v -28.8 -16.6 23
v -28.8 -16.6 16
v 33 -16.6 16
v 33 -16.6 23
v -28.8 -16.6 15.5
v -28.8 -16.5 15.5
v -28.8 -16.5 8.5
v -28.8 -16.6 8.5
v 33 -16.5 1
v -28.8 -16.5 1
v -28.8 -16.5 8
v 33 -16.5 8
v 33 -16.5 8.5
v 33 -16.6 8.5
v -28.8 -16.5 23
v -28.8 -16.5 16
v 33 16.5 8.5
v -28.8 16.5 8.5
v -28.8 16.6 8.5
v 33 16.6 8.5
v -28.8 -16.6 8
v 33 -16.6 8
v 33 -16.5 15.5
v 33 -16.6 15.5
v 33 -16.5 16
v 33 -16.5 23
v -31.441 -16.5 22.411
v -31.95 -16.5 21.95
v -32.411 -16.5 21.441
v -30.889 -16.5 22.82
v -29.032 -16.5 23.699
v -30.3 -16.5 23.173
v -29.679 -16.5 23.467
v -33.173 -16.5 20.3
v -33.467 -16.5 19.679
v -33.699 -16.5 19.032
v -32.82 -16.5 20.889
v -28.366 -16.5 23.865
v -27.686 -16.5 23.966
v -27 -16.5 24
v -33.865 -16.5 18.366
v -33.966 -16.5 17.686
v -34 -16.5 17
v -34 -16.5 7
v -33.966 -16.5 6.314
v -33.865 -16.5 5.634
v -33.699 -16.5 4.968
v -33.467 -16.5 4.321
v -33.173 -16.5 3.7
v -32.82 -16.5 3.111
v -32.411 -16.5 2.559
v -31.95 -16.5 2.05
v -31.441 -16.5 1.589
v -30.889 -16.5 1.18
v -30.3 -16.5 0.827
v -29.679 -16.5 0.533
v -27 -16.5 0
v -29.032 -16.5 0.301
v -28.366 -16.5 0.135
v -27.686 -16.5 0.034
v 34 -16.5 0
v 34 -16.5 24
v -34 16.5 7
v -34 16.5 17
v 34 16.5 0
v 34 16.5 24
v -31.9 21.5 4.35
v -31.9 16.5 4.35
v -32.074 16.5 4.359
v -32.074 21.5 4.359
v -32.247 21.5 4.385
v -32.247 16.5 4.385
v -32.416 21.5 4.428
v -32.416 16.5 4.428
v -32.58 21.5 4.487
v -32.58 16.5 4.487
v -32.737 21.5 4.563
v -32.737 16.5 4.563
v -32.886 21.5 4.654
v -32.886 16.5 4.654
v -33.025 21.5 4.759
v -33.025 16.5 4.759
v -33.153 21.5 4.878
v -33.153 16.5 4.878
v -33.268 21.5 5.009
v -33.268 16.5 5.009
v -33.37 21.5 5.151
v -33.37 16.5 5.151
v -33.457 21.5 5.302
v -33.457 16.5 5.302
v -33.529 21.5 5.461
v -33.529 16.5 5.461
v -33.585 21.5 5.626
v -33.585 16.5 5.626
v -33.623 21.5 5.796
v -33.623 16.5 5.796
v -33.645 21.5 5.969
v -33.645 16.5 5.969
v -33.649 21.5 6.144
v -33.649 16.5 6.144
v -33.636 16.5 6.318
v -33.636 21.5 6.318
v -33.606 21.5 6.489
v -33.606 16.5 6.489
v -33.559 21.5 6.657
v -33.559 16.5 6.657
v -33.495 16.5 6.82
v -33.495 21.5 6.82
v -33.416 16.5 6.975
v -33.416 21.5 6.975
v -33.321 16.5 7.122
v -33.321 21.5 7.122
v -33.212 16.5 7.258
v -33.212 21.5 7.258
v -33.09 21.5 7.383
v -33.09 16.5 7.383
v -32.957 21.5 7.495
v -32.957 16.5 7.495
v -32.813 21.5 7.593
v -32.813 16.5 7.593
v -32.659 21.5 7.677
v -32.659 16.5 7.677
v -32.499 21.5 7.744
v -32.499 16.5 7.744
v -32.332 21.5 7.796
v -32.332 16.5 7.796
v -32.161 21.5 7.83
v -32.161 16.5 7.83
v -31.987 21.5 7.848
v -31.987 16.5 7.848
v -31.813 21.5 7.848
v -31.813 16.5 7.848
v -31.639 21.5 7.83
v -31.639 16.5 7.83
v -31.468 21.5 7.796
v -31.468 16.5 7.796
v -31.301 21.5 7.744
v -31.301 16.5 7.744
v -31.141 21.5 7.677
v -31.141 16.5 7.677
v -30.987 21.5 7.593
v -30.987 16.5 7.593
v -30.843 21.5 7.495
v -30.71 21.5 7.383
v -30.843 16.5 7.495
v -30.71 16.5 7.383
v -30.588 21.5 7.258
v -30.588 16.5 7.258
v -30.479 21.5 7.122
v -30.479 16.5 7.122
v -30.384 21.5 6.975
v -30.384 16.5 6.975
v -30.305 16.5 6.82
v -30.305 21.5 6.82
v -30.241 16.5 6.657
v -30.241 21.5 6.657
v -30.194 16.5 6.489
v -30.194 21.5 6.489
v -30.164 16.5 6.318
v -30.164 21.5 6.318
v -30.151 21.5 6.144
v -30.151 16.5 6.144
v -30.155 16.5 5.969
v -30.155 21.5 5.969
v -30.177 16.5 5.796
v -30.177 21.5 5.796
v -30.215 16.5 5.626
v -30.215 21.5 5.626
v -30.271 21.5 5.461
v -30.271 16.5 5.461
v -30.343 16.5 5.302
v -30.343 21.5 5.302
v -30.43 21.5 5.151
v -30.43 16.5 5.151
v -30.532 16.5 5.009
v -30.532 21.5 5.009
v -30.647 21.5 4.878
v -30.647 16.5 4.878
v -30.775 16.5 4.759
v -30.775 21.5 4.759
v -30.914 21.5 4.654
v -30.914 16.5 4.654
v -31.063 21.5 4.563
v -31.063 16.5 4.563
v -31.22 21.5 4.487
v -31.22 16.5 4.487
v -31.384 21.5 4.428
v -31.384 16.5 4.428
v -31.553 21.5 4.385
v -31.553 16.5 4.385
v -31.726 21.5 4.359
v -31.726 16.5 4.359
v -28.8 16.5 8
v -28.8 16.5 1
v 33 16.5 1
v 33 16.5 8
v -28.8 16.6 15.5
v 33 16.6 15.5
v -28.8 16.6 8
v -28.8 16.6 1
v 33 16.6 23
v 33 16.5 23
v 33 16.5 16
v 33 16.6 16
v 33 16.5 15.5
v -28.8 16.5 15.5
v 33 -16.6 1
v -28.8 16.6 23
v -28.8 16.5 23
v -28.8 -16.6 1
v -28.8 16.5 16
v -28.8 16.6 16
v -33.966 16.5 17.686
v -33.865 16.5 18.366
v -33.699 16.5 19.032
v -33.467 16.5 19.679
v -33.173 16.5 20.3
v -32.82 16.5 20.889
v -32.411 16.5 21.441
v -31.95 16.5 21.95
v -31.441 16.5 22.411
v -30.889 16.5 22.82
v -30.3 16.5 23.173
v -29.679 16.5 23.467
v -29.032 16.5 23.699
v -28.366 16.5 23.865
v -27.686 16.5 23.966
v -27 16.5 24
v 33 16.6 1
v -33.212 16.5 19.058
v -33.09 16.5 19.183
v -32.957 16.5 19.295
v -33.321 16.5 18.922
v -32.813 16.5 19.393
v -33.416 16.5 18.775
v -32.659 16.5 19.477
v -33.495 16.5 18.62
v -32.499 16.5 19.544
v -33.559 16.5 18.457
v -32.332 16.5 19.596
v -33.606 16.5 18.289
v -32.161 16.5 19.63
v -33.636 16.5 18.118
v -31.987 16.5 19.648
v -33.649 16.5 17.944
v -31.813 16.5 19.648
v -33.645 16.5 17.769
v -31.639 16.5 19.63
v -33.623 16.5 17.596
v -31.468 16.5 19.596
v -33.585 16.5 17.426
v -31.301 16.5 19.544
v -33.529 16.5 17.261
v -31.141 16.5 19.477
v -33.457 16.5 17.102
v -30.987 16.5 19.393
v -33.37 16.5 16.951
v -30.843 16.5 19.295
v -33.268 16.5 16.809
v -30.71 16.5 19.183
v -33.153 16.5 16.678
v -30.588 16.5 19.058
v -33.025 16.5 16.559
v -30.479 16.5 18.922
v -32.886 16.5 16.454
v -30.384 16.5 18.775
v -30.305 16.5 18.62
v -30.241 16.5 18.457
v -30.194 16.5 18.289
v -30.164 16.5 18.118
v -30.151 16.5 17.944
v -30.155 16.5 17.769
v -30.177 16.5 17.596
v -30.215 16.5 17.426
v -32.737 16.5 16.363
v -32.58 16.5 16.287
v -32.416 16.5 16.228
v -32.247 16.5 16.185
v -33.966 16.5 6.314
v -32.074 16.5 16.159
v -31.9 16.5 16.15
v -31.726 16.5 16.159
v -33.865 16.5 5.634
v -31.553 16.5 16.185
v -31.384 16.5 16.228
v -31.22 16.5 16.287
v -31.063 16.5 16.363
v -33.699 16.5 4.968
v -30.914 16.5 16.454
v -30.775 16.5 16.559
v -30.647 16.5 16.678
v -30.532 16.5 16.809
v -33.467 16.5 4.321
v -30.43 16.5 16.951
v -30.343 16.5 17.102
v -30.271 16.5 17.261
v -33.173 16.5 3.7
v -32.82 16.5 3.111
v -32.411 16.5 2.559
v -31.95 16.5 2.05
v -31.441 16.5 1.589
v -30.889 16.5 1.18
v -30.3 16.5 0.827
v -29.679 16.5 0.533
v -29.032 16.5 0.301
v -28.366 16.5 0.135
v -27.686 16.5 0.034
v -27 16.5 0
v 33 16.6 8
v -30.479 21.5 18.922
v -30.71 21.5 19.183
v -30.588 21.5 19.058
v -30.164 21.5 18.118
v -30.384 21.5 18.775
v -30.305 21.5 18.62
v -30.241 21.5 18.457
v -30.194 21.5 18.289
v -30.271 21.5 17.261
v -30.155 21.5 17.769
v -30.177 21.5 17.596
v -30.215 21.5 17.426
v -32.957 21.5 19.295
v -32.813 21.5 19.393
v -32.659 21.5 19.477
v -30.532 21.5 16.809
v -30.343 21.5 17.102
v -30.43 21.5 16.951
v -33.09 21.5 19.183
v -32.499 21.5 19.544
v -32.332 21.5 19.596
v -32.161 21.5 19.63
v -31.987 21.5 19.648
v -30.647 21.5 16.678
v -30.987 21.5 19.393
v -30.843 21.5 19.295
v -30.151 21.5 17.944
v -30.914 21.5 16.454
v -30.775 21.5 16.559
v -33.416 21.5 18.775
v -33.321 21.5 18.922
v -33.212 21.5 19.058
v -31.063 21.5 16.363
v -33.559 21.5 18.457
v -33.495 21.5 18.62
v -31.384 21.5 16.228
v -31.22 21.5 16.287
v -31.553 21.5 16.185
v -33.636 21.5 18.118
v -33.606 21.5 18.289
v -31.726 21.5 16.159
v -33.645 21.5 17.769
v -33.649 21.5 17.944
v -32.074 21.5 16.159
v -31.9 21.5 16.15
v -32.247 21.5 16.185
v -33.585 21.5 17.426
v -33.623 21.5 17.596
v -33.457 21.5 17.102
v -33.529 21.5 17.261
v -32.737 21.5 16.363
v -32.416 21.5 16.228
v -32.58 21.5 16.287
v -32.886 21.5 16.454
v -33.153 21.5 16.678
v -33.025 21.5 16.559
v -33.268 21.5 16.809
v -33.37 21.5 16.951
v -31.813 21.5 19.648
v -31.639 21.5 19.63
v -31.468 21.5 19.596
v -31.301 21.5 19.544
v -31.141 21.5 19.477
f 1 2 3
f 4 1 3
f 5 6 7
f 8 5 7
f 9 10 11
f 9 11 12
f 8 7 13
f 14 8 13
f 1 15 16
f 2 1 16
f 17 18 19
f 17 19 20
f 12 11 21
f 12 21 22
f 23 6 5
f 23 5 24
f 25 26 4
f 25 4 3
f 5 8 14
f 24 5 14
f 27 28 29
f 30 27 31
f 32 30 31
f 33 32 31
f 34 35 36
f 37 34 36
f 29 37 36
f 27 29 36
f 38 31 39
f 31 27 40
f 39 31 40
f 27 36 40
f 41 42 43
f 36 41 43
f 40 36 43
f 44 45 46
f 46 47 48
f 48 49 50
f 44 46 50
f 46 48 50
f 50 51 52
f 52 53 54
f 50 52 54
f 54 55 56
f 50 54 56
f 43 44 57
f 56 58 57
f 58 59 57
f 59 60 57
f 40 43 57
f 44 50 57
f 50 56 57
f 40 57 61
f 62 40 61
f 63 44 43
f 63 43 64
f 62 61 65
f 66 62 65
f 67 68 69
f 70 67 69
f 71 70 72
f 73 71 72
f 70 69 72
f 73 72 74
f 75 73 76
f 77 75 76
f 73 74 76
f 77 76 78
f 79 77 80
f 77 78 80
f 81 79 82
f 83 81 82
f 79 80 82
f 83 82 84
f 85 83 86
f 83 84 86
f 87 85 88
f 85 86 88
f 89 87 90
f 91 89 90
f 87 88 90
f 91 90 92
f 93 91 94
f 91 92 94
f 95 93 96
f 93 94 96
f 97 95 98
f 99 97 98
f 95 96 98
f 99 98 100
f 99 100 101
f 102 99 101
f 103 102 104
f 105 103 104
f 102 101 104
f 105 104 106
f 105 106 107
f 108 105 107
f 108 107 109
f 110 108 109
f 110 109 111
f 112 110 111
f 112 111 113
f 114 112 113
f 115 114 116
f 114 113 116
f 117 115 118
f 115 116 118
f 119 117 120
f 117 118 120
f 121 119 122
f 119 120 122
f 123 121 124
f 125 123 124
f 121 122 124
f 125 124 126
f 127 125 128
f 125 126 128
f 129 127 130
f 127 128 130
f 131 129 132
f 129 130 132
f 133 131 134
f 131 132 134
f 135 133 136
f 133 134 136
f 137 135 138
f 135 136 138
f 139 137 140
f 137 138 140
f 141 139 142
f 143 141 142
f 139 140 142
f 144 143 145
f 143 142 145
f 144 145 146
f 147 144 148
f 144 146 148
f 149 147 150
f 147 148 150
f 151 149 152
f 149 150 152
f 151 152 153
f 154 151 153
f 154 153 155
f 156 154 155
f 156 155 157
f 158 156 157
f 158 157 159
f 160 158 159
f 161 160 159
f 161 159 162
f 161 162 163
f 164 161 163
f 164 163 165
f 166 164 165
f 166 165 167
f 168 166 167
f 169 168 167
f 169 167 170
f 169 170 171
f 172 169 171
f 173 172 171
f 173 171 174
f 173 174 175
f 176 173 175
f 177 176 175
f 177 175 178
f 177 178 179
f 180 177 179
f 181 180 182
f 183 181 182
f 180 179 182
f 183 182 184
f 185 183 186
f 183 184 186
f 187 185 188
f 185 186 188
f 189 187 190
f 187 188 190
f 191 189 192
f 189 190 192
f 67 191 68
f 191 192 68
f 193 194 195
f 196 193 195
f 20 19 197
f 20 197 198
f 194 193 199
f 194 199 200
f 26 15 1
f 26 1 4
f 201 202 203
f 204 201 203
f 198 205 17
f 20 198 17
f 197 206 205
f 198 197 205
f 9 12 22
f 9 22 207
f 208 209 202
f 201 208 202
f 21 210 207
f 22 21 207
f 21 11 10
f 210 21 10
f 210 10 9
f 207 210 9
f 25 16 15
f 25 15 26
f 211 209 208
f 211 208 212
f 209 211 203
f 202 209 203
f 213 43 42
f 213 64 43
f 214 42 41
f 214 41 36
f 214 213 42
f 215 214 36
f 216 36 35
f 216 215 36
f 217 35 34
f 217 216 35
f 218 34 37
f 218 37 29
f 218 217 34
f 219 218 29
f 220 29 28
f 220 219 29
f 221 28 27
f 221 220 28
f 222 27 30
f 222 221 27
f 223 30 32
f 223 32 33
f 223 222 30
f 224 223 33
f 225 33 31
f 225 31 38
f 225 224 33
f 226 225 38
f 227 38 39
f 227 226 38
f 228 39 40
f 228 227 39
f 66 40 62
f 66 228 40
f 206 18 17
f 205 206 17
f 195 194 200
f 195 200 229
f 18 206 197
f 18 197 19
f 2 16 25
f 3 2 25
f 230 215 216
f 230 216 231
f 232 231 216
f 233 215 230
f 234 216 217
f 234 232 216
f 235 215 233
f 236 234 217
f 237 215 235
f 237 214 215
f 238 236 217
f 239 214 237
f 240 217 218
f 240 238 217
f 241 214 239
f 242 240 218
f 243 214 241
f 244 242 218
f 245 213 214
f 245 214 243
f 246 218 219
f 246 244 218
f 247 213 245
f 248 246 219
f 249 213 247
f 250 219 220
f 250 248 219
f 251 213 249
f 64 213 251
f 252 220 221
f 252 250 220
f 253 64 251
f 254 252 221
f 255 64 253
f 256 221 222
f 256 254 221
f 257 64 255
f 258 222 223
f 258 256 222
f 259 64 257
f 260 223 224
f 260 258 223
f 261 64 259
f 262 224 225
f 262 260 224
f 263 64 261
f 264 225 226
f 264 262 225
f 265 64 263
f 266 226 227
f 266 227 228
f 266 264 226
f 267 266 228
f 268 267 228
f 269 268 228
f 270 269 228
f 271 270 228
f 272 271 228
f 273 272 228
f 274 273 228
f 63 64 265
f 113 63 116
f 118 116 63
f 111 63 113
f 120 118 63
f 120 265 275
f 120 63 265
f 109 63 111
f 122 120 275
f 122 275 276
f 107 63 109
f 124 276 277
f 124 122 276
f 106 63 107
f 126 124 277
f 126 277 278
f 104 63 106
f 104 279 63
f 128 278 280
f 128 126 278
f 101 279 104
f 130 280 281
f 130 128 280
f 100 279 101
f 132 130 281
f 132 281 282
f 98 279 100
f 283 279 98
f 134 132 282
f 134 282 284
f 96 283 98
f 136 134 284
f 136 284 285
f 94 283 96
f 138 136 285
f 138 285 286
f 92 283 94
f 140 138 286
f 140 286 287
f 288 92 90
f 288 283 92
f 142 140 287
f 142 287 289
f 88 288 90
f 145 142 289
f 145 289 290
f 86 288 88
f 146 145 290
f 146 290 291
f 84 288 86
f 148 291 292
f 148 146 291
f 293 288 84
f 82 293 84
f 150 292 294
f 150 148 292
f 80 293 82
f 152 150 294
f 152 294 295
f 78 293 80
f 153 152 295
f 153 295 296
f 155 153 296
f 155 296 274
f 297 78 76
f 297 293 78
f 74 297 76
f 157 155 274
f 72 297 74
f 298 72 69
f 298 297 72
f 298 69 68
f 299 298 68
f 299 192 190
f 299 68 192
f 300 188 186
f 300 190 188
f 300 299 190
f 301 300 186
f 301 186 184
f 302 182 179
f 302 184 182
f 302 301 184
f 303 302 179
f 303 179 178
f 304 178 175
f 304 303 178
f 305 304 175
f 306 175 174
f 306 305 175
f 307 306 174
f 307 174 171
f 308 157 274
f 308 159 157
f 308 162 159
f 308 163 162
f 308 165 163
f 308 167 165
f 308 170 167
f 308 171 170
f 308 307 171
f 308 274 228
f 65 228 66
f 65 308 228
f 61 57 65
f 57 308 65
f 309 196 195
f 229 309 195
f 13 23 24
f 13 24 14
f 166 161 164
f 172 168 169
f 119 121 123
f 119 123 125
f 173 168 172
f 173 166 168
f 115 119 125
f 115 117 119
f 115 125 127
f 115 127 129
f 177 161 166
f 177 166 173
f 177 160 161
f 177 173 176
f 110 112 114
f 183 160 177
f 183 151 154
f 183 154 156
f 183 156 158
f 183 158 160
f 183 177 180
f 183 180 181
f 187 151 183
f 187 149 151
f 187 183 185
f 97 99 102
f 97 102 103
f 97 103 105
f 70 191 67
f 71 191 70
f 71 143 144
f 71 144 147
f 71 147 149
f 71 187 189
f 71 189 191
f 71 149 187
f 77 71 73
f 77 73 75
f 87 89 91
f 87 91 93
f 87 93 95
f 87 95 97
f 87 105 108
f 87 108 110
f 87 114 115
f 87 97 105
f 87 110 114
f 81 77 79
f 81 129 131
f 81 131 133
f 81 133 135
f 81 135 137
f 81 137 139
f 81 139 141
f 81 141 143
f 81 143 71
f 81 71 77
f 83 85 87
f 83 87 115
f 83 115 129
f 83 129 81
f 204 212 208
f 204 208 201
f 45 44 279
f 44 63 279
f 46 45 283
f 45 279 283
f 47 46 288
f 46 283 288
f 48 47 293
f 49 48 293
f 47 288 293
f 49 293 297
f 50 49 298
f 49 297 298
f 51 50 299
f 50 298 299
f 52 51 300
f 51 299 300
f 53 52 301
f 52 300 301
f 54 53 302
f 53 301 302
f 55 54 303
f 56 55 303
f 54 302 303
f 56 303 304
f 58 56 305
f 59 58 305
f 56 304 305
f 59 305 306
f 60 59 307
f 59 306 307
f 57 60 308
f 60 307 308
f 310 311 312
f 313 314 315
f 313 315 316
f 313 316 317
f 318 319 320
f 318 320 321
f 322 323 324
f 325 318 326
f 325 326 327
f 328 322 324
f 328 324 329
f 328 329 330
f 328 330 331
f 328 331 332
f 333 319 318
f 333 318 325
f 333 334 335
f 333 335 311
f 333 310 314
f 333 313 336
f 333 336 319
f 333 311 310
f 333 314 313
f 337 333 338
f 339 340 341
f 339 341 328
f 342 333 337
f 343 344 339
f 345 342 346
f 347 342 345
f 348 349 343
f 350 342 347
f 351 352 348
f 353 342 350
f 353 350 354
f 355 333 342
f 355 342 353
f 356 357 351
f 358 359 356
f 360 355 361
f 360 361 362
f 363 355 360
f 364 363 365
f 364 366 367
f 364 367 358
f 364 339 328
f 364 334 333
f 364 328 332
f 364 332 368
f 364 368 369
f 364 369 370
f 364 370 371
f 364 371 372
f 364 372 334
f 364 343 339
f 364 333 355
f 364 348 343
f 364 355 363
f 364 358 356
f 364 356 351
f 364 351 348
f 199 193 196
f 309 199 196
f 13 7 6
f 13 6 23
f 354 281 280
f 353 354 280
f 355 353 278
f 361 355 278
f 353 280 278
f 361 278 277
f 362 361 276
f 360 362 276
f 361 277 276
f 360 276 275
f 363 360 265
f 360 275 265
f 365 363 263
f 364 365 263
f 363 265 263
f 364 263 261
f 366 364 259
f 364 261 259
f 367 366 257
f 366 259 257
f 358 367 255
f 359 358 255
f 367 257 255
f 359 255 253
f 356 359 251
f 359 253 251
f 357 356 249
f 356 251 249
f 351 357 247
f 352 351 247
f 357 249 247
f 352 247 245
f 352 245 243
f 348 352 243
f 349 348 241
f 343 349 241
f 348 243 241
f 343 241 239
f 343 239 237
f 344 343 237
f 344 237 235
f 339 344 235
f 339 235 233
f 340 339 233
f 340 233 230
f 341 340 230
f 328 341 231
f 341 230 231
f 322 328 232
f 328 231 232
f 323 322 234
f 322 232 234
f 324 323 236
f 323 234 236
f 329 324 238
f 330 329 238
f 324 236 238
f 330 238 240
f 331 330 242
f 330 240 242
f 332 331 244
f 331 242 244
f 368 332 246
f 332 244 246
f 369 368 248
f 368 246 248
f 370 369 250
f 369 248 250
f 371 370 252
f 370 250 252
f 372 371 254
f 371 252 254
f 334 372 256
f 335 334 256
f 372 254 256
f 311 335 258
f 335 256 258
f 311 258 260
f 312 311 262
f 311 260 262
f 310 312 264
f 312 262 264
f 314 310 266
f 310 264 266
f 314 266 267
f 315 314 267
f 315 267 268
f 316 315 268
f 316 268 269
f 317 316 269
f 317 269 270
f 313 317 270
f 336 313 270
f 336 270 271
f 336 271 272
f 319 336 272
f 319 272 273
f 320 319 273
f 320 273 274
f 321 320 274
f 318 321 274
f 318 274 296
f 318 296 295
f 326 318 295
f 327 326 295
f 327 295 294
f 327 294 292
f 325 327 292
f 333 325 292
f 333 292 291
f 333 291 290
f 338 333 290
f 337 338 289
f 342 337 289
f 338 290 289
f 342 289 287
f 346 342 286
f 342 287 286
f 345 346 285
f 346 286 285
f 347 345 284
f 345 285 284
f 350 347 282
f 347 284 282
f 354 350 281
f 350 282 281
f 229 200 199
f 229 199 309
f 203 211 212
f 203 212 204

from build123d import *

# Parameters (mm, degrees)
SKETCH1_W             = 68
SKETCH1_H             = 33
BOSS_EXTRUDE1_DEPTH   = 24
FILLET1_R             = 7
SKETCH2_W             = 61.8
SKETCH2_H             = 7
BOSS_EXTRUDE2_DEPTH   = 0.1
BOSS_EXTRUDE2_2_DEPTH = 0.1
BOSS_EXTRUDE2_3_DEPTH = 0.1
SKETCH3_R             = 1.75
BOSS_EXTRUDE3_DEPTH   = 5


with BuildPart() as part:
    # Sketch1 → Boss-Extrude1 (new body)
    with BuildSketch(Plane.XY):
        Rectangle(SKETCH1_W, SKETCH1_H)
    extrude(amount=BOSS_EXTRUDE1_DEPTH)

    # Fillet1
    fillet1_edges = [part.edges().sort_by_distance(p)[0] for p in [
        (-34, 0, 24),
        (-34, 0, 0),
    ]]
    fillet(fillet1_edges, radius=FILLET1_R)

    # Sketch3 → Boss-Extrude3 (add)
    with BuildSketch(Plane(origin=(0, 16.5, 0), x_dir=(1, 0, 0), z_dir=(0, 1, 0))):
        with Locations(Location((-31.9, -6.1, 0), (0, 0, 90))):
            Circle(SKETCH3_R)
        with Locations(Location((-31.9, -17.9, 0), (0, 0, 90))):
            Circle(SKETCH3_R)
    extrude(amount=BOSS_EXTRUDE3_DEPTH)


with BuildPart() as body_2:
    # Sketch2 → Boss-Extrude2 (new body)
    with BuildSketch(Plane(origin=(0, 16.5, 0), x_dir=(1, 0, 0), z_dir=(0, 1, 0))):
        with Locations((2.1, -4.5)):
            Rectangle(SKETCH2_W, SKETCH2_H)
    extrude(amount=BOSS_EXTRUDE2_DEPTH)


with BuildPart() as body_3:
    # Sketch2 → Boss-Extrude2 2 (new body)
    with BuildSketch(Plane(origin=(0, 16.5, 0), x_dir=(1, 0, 0), z_dir=(0, 1, 0))):
        with Locations((2.1, -12)):
            Rectangle(SKETCH2_W, SKETCH2_H)
    extrude(amount=BOSS_EXTRUDE2_2_DEPTH)


with BuildPart() as body_4:
    # Sketch2 → Boss-Extrude2 3 (new body)
    with BuildSketch(Plane(origin=(0, 16.5, 0), x_dir=(1, 0, 0), z_dir=(0, 1, 0))):
        with Locations((2.1, -19.5)):
            Rectangle(SKETCH2_W, SKETCH2_H)
    extrude(amount=BOSS_EXTRUDE2_3_DEPTH)


with BuildPart() as body_5:
    # Mirror1: mirrored copy
    add(body_4.part.mirror(Plane.ZX))


with BuildPart() as body_6:
    # Mirror1 2: mirrored copy
    add(body_3.part.mirror(Plane.ZX))


with BuildPart() as body_7:
    # Mirror1 3: mirrored copy
    add(body_2.part.mirror(Plane.ZX))


solid = Compound([part.part, body_2.part, body_3.part, body_4.part, body_5.part, body_6.part, body_7.part])
